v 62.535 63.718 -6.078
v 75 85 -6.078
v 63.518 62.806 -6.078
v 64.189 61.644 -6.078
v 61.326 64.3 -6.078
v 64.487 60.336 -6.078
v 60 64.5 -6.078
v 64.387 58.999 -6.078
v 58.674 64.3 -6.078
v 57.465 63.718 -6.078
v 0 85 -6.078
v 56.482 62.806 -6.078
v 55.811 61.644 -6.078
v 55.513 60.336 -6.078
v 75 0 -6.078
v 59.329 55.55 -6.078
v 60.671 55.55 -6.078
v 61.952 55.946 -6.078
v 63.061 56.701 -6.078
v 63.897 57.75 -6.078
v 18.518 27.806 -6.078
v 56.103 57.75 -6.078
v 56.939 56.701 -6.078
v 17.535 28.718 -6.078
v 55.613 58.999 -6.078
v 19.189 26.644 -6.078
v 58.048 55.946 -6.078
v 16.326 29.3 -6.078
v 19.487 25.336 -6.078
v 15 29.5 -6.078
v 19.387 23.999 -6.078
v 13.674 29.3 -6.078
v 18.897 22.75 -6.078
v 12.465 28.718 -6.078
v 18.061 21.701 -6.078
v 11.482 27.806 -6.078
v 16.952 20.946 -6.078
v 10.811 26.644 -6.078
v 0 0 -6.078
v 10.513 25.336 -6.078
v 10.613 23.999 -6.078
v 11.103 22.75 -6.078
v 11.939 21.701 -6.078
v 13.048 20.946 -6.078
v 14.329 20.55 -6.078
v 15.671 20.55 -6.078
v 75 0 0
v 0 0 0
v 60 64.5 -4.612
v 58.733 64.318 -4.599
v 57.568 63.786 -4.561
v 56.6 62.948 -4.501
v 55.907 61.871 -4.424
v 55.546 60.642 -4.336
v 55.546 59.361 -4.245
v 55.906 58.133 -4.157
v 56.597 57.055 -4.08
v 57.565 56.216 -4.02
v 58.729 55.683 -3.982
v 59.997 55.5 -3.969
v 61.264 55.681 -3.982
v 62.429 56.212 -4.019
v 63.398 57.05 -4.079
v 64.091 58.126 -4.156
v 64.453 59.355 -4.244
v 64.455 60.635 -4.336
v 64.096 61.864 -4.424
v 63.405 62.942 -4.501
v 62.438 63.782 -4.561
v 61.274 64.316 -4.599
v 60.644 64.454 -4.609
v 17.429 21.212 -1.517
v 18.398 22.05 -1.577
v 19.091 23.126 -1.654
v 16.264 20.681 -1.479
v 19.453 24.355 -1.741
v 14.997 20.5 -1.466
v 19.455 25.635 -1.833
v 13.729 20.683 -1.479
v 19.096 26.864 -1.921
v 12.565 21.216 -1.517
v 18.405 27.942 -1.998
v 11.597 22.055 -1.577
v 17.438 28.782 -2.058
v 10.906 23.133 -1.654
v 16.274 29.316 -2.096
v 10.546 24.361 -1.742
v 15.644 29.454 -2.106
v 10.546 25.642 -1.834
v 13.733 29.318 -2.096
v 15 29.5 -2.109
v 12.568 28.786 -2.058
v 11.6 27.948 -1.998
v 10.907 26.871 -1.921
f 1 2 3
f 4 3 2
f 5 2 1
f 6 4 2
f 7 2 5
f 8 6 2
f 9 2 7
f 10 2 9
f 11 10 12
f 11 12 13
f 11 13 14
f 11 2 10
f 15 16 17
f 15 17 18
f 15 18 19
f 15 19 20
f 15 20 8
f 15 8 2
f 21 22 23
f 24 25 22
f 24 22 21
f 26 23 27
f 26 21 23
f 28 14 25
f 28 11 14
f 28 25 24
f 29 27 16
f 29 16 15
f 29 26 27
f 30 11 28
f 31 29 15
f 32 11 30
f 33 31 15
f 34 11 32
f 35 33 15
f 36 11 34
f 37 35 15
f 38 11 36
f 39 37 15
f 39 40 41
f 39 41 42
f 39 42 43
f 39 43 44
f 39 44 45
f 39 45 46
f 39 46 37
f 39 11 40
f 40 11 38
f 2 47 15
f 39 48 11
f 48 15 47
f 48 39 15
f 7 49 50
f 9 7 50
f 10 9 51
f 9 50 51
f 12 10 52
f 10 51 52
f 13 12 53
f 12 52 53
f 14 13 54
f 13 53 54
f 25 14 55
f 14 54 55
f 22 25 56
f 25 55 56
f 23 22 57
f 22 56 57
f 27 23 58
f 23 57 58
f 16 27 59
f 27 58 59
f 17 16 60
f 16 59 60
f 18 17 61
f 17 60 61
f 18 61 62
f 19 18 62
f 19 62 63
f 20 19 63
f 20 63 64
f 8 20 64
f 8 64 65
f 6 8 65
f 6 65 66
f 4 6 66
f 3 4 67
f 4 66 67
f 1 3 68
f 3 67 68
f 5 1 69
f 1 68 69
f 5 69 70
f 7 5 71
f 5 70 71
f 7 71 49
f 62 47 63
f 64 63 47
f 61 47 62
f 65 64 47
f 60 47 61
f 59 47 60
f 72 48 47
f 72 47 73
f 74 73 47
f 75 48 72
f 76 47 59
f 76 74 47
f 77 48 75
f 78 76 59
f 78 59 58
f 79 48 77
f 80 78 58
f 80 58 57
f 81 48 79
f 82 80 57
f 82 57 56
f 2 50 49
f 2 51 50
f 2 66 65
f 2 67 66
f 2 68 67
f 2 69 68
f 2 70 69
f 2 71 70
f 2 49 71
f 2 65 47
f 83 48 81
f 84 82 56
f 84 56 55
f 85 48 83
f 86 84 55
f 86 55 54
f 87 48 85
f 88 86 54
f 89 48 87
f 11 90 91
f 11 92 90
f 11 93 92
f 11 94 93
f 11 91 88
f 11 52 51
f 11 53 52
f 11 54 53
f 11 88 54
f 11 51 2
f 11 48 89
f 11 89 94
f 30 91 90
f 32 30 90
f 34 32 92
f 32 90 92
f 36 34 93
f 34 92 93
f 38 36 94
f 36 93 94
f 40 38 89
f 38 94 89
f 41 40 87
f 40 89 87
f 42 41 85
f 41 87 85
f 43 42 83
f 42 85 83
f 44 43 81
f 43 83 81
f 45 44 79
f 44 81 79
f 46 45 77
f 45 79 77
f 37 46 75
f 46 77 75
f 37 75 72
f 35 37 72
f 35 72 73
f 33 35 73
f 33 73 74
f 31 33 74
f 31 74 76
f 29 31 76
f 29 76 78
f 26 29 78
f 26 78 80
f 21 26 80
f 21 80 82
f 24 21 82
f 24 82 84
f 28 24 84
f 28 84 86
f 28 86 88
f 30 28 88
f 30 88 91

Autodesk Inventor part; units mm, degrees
ref_plane "YZ Plane" through (0, 0, 0) normal (1, 0, 0) x (0, 1, 0)
ref_plane "XZ Plane" through (0, 0, 0) normal (0, 1, 0) x (-1, 0, 0)
ref_plane "XY Plane" through (0, 0, 0) normal (0, 0, 1) x (1, 0, 0)
sketch "Sketch1" plane through (0, 0, 0) normal (1, 0, 0) x (0, 1, 0)
  line L0 (0, 0) -> (74.6232, 0)
  line L1 (0, 0) -> (85, -6.078)
  line L2 (85, -6.078) -> (0, -6.078)
  line L3 (0, -6.078) -> (0, 0)
  dimension "d0" = 4.09
  dimension "d1" = 85
extrude "Extrusion1" add sketch "Sketch1" along normal blind 75
sketch "Sketch2" plane through (0, 0, -6.078) normal (0, 0, -1) x (-1, 0, 0)
  line L0 (0, 0) -> (0, 85) projected
  line L1 (0, 85) -> (-75, 85) projected
  line L2 (-75, 0) -> (-75, 85) projected
  line L3 (0, 0) -> (-75, 0) projected
  point P0 (0, 0)
  point P1 (-15, 25)
  point P2 (-60, 60)
  dimension "d4" = 25
  dimension "d5" = 15
  dimension "d6" = 15
  dimension "d7" = 25
hole "Hole1" at (15, 25, -6.078) at (60, 60, -6.078) direction (0, 0, 1) diameter 9 depth 10 tip angle 118 clearance for "Socket Head Cap Screw ISO 4762" size "M8" standard "ISO"
properties part number "skos_smietnik1"
